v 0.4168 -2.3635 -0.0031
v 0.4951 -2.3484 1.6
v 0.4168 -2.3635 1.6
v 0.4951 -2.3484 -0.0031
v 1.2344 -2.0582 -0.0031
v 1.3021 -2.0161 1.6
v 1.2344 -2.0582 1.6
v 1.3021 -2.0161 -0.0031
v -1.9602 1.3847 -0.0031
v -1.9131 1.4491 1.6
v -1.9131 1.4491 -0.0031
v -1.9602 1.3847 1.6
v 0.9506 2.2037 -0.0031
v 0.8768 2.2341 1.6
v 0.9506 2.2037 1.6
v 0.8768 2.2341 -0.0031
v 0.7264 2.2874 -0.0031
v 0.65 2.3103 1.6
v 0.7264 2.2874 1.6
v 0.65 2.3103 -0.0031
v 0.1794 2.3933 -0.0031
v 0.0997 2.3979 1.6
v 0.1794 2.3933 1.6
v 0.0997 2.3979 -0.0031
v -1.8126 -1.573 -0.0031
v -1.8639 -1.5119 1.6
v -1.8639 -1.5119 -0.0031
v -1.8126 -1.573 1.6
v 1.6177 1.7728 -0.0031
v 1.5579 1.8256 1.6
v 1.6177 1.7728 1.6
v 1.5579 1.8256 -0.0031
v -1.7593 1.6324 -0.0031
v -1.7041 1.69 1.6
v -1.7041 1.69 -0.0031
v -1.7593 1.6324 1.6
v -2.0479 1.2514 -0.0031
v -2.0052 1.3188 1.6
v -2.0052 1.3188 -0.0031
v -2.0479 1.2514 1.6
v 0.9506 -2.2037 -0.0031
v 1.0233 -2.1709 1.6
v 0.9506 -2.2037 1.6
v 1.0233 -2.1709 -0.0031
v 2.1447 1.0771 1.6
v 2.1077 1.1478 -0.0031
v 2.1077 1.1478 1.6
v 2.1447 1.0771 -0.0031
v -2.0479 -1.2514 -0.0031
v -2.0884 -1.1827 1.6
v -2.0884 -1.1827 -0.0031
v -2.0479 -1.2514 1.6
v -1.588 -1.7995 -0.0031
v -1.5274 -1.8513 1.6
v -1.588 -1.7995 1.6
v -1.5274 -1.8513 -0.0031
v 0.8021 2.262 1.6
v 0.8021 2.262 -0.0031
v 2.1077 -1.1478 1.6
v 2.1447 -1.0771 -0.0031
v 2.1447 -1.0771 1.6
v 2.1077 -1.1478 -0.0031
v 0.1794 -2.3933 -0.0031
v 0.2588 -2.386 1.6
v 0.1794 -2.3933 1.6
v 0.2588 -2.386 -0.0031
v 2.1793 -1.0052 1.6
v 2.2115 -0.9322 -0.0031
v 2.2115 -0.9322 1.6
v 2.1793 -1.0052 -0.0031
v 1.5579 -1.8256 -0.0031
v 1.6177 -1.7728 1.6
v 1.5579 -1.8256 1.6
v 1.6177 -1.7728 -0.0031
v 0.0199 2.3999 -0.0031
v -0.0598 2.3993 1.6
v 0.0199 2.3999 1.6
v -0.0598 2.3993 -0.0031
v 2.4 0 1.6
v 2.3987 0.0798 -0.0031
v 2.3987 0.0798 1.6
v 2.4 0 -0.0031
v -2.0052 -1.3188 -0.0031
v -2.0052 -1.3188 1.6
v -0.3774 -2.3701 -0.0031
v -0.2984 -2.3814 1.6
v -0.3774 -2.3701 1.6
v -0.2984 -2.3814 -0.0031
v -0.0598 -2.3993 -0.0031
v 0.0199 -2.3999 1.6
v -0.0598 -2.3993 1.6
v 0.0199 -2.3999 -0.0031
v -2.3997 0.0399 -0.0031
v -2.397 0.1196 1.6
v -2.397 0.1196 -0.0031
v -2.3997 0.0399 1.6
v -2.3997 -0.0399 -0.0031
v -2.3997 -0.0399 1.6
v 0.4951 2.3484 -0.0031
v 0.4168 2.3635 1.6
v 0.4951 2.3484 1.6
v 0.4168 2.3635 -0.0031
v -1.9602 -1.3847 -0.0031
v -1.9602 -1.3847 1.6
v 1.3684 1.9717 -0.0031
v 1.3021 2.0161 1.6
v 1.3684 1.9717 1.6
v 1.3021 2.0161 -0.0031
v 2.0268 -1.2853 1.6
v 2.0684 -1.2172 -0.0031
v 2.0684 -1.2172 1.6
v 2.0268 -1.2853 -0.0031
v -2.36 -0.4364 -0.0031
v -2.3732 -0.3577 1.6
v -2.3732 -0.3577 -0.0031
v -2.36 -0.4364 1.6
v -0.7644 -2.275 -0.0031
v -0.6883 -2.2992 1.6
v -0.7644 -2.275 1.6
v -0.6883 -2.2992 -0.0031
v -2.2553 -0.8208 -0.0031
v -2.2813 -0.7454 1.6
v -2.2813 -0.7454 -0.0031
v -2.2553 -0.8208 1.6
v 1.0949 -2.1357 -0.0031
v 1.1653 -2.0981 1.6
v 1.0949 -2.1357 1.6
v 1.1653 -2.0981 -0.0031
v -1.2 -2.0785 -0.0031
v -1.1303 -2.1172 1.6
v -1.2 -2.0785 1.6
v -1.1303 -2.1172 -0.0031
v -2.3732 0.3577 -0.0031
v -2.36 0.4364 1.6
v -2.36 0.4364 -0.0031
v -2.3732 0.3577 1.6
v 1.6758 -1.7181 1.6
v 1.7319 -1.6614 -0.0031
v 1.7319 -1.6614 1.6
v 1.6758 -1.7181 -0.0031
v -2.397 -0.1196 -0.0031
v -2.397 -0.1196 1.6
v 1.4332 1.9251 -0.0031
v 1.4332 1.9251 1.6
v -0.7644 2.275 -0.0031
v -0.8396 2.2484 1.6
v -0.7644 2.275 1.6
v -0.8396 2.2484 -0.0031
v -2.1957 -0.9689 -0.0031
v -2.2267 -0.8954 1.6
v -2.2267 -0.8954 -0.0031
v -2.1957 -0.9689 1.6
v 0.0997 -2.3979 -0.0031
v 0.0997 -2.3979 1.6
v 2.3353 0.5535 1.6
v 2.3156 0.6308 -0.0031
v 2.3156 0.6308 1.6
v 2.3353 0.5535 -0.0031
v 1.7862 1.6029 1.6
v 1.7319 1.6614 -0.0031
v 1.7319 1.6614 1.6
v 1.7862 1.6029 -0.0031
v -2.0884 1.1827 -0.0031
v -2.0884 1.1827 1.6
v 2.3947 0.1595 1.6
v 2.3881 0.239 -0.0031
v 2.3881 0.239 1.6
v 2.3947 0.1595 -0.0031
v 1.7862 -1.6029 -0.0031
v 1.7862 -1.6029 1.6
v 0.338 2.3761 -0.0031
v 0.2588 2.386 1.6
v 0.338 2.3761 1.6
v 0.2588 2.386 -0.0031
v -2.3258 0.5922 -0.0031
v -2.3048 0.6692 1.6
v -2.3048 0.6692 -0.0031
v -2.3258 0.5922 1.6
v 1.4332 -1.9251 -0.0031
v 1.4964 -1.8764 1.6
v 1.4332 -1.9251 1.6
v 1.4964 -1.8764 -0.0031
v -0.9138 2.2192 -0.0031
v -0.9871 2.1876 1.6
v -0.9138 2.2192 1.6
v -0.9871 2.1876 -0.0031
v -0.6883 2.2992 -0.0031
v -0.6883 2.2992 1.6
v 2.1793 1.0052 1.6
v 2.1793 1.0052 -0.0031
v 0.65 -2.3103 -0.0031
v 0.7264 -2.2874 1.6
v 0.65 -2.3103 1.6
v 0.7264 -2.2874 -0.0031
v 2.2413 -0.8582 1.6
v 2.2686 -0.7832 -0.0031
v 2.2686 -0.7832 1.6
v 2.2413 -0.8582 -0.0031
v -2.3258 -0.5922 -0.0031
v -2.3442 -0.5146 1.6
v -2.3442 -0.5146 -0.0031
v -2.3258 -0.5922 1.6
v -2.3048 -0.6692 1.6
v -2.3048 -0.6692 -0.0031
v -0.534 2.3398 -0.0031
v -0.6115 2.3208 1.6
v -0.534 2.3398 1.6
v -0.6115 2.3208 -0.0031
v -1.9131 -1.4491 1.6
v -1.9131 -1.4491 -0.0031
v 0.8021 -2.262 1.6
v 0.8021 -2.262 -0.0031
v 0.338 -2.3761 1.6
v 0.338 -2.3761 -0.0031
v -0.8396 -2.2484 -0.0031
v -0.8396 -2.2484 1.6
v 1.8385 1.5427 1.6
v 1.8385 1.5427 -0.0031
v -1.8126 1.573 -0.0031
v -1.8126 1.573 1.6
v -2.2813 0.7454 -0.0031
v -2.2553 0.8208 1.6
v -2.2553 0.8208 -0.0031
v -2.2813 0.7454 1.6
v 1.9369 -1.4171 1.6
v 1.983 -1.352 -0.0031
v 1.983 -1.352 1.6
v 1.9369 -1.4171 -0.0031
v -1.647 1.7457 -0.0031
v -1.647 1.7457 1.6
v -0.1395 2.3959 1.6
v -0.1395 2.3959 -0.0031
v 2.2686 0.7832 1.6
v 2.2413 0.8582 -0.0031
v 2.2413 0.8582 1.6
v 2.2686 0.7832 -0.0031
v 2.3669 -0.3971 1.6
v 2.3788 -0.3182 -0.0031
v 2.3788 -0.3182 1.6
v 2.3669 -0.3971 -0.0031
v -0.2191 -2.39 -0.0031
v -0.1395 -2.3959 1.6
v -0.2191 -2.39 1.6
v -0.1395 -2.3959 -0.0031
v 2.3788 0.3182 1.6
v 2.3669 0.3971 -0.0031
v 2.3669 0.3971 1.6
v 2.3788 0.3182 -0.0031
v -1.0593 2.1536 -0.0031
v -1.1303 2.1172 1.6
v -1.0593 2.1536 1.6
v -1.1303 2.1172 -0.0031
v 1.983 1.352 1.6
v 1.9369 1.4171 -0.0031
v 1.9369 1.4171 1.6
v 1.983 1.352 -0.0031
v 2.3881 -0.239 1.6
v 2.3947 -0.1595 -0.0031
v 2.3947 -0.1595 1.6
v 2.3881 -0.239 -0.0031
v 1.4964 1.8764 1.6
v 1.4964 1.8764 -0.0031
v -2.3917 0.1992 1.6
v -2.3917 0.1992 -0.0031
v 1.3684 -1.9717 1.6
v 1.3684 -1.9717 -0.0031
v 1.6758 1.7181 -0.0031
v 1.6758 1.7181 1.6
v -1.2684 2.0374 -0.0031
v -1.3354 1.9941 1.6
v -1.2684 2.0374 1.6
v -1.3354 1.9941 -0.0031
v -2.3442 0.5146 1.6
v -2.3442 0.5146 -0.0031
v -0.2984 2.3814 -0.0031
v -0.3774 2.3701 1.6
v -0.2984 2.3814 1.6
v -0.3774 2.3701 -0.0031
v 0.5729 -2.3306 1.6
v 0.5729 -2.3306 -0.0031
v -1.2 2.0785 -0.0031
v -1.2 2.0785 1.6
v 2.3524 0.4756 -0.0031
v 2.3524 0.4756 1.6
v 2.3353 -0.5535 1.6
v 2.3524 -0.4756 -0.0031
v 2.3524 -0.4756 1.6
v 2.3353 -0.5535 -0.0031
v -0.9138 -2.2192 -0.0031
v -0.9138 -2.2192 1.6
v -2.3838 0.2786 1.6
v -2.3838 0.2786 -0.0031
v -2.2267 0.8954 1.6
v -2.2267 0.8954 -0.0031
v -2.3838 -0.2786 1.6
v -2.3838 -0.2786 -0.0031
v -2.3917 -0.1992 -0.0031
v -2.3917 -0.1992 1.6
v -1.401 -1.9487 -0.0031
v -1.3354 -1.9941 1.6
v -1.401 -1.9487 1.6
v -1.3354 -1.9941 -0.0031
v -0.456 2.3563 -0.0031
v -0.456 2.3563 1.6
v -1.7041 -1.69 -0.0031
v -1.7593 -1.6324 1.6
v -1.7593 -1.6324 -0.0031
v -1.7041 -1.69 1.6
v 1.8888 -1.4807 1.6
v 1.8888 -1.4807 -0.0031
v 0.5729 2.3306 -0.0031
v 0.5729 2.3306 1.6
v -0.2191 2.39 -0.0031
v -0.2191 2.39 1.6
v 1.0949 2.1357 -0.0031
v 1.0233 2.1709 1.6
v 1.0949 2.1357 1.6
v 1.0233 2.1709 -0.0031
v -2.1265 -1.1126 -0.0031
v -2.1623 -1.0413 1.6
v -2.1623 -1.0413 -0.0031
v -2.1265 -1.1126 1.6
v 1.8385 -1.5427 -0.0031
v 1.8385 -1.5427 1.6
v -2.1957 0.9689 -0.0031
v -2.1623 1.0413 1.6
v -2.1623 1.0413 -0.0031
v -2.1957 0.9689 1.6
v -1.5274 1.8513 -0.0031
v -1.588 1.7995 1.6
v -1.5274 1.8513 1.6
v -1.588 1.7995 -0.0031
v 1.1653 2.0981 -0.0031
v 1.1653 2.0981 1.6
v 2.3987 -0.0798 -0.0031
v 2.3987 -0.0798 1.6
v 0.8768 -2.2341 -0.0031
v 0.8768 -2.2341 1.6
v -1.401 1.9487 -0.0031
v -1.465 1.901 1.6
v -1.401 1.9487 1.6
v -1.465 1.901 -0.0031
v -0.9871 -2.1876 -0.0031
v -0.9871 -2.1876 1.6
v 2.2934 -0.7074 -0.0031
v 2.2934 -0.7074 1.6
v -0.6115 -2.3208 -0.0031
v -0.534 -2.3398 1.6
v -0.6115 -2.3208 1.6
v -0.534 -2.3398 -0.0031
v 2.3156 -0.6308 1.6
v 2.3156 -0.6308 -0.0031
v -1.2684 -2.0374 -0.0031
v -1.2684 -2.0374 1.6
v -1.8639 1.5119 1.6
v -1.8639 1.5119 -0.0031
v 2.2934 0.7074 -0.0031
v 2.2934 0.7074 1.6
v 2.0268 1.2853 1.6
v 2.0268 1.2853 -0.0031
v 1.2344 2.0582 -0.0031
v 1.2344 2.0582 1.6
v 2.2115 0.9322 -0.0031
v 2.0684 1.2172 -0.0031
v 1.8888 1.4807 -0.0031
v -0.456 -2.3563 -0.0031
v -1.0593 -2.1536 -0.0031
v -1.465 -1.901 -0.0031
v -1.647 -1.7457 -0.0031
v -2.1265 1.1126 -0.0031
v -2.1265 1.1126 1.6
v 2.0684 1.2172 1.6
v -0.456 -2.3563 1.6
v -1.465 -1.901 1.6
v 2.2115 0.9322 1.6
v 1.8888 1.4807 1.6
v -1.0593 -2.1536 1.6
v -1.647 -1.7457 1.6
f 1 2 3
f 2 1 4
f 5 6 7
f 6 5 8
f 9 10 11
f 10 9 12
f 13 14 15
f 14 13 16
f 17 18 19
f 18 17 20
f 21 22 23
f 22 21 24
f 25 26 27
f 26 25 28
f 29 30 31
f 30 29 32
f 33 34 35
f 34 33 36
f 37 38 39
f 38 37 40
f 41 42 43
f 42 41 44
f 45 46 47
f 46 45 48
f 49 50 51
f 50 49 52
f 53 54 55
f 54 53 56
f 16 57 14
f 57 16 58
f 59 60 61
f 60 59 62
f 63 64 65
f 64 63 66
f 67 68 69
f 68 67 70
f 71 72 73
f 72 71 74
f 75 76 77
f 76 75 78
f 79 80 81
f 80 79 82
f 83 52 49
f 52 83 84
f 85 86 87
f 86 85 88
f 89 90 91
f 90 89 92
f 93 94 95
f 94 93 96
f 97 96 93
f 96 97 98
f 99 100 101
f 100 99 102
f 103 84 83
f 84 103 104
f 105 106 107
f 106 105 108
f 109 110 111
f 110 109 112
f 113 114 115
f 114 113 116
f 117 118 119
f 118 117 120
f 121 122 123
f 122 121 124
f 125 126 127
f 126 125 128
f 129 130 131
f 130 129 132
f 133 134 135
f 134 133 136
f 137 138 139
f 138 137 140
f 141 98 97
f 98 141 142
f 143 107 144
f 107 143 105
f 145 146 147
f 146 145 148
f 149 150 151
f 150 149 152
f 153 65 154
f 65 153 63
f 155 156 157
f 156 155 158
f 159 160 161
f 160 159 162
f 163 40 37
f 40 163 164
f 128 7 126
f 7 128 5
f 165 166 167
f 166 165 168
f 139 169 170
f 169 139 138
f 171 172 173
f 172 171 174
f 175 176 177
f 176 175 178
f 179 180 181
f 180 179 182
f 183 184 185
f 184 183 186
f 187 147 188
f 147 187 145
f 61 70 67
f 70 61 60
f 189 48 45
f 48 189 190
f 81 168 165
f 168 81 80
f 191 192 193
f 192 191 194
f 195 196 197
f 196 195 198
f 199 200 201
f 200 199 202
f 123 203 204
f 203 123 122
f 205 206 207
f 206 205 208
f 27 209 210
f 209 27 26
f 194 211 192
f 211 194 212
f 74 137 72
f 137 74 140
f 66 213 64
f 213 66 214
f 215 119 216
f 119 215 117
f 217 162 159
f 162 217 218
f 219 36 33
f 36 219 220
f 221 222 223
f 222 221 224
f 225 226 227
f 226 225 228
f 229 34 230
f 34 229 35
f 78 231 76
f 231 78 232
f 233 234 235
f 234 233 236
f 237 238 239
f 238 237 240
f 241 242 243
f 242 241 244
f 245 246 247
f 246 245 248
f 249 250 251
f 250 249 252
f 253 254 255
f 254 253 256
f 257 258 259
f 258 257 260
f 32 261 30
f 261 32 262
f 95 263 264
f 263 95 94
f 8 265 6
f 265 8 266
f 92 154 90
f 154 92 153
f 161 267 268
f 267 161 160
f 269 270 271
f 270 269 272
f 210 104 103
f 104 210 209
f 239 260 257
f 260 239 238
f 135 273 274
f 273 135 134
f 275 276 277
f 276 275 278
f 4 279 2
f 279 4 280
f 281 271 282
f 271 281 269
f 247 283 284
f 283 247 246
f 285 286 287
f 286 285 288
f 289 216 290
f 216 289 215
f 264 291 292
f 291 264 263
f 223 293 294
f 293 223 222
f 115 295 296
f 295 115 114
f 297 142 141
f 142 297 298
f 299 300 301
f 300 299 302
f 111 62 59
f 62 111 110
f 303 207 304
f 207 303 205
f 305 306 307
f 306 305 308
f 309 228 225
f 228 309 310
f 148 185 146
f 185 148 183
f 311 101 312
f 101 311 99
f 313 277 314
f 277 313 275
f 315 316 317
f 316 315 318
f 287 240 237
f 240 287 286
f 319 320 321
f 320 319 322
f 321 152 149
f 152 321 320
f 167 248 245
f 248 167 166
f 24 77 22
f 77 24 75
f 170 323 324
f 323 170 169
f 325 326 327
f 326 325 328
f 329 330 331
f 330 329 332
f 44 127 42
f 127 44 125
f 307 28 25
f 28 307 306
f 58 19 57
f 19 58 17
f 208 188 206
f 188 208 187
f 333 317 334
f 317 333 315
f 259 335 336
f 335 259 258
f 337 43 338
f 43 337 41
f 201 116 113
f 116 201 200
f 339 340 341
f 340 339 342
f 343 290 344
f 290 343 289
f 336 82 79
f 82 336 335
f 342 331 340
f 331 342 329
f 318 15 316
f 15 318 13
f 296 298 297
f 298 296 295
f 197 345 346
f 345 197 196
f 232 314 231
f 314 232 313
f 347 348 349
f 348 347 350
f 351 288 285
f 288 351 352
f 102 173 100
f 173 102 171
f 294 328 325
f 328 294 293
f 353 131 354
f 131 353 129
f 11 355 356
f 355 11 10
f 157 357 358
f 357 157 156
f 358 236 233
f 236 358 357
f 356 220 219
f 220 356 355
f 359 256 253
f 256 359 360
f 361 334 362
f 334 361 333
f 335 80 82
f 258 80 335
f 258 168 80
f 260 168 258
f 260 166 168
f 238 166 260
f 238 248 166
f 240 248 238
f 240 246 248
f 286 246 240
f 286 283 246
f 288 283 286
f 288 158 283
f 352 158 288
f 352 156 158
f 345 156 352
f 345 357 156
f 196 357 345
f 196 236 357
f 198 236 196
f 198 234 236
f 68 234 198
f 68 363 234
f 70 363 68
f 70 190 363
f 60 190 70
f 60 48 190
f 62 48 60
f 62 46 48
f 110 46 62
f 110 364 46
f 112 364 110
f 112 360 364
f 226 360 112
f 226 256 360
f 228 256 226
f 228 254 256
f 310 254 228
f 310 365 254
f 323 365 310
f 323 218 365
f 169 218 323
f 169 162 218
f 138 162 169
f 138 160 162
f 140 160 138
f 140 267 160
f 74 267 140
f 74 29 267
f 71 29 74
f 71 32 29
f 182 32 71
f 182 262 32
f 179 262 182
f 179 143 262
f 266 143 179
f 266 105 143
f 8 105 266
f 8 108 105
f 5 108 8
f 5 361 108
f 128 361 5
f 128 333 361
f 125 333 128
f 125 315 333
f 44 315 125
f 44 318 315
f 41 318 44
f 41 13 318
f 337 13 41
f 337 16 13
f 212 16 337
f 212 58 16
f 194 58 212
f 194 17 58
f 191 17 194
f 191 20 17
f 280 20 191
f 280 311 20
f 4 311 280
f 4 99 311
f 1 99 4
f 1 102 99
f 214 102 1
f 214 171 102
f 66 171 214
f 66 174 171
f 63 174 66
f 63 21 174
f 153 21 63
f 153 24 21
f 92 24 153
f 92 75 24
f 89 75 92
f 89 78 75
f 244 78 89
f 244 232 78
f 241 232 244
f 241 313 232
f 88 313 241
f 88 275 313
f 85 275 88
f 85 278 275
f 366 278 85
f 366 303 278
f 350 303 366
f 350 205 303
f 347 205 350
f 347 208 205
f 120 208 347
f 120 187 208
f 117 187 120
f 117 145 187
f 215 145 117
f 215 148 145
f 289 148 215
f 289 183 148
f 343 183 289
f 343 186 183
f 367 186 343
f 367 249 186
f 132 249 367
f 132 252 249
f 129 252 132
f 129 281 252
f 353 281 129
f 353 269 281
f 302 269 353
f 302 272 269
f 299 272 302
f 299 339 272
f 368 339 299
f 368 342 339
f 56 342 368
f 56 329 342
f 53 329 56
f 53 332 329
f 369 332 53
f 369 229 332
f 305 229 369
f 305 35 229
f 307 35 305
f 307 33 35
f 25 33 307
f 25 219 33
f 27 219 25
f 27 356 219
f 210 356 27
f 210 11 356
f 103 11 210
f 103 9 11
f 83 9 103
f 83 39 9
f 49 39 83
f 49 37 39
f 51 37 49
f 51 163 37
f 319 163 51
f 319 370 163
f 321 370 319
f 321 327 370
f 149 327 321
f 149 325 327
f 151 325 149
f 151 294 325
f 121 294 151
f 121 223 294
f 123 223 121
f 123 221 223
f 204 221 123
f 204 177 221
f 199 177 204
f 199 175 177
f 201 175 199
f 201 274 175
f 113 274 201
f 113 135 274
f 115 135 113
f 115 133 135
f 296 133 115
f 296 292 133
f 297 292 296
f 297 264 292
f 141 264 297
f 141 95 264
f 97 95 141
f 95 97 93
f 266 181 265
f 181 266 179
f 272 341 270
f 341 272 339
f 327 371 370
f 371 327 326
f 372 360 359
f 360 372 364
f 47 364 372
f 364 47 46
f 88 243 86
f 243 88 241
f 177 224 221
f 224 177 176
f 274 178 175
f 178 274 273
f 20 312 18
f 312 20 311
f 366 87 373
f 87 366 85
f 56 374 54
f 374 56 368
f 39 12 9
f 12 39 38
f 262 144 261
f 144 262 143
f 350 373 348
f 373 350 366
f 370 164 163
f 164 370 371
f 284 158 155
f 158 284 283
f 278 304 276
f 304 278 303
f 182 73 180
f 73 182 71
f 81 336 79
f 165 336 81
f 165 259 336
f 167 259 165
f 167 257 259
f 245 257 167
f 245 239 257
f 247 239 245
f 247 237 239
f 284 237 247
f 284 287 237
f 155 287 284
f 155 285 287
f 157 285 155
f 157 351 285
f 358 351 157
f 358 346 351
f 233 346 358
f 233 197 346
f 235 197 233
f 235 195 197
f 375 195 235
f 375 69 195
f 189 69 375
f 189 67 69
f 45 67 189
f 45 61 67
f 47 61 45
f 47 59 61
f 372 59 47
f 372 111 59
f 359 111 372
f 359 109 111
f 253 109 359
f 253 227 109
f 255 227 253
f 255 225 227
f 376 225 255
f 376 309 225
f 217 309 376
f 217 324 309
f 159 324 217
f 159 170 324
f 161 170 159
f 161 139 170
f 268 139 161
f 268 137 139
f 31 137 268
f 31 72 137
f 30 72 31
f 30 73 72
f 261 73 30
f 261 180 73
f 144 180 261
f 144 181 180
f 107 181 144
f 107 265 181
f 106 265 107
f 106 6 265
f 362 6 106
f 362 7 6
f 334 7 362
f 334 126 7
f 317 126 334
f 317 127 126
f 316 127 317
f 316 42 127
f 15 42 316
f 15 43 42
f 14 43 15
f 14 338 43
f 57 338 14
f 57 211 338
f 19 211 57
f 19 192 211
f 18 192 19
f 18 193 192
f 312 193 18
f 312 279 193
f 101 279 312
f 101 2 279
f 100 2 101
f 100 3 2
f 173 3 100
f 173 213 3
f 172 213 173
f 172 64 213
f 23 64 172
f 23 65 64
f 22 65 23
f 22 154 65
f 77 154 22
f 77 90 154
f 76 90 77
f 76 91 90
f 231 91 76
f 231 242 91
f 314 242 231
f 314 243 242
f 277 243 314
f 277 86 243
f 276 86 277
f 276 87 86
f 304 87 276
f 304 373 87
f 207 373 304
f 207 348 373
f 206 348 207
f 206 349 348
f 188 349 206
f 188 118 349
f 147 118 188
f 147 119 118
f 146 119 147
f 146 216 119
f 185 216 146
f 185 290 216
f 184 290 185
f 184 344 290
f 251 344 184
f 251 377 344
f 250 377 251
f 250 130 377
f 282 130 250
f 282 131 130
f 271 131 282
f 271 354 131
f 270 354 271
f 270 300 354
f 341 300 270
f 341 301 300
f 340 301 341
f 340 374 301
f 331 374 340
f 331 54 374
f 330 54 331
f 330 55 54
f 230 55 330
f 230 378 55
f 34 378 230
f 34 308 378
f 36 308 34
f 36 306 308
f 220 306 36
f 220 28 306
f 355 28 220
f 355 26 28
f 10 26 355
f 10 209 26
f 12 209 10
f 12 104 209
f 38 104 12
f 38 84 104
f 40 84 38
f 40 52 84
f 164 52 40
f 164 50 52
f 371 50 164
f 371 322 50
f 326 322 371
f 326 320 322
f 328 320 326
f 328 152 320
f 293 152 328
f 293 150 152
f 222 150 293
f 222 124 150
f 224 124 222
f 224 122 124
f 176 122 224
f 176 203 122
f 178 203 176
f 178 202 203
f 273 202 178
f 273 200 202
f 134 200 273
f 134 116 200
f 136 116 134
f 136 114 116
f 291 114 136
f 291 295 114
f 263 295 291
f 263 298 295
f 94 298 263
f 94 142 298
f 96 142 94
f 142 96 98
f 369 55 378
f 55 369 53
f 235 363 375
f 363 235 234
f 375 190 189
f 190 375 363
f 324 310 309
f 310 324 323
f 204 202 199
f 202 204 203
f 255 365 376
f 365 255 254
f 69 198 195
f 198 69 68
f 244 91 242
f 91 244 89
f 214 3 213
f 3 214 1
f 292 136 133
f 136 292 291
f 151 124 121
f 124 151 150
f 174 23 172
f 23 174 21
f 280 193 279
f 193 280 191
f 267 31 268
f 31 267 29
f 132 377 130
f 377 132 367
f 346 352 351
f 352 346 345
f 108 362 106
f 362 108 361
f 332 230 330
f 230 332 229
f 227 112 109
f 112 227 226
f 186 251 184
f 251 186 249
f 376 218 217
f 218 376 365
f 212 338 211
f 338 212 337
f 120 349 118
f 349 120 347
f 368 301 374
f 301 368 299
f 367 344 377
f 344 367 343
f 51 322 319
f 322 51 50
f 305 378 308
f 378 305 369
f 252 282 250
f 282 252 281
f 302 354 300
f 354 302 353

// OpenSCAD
use <../lib.scad>
use <60583a.scad>
$fa=1; $fs=0.2;
function ldraw_lib__60583(realsolid=false) = [
// 0 ~Moved to 60583a
// 0 Name: 60583.dat
// 0 Author: [PTadmin]
// 0 !LDRAW_ORG Part UPDATE 2019-03
// 0 !LICENSE Licensed under CC BY 4.0 : see CAreadme.txt
// 
// 0 BFC CERTIFY CCW
  [0,"BFC","CERTIFY"],
  [0,"BFC","CCW"],
// 
// 0 !HISTORY 2019-12-27 [PTadmin] Official Update 2019-03
// 
// 
// 0 // Brick 1 x 1 x 3 with Two Clips Vertical and Solid Stud
// 1 16 0 0 0 1 0 0 0 1 0 0 0 1 60583a.dat
  [1,16,0,0,0,1,0,0,0,1,0,0,0,1, ldraw_lib__60583a(realsolid)],
];
module ldraw_lib__60583(step=0, col=false, unit=2/5, alt=false, line=0.2, solid=!$preview)
    makepoly(ldraw_lib__60583(solid), step=step, col=col, unit=unit, alt=alt, line=line, solid=solid);
ldraw_lib__60583(line=0.2);
